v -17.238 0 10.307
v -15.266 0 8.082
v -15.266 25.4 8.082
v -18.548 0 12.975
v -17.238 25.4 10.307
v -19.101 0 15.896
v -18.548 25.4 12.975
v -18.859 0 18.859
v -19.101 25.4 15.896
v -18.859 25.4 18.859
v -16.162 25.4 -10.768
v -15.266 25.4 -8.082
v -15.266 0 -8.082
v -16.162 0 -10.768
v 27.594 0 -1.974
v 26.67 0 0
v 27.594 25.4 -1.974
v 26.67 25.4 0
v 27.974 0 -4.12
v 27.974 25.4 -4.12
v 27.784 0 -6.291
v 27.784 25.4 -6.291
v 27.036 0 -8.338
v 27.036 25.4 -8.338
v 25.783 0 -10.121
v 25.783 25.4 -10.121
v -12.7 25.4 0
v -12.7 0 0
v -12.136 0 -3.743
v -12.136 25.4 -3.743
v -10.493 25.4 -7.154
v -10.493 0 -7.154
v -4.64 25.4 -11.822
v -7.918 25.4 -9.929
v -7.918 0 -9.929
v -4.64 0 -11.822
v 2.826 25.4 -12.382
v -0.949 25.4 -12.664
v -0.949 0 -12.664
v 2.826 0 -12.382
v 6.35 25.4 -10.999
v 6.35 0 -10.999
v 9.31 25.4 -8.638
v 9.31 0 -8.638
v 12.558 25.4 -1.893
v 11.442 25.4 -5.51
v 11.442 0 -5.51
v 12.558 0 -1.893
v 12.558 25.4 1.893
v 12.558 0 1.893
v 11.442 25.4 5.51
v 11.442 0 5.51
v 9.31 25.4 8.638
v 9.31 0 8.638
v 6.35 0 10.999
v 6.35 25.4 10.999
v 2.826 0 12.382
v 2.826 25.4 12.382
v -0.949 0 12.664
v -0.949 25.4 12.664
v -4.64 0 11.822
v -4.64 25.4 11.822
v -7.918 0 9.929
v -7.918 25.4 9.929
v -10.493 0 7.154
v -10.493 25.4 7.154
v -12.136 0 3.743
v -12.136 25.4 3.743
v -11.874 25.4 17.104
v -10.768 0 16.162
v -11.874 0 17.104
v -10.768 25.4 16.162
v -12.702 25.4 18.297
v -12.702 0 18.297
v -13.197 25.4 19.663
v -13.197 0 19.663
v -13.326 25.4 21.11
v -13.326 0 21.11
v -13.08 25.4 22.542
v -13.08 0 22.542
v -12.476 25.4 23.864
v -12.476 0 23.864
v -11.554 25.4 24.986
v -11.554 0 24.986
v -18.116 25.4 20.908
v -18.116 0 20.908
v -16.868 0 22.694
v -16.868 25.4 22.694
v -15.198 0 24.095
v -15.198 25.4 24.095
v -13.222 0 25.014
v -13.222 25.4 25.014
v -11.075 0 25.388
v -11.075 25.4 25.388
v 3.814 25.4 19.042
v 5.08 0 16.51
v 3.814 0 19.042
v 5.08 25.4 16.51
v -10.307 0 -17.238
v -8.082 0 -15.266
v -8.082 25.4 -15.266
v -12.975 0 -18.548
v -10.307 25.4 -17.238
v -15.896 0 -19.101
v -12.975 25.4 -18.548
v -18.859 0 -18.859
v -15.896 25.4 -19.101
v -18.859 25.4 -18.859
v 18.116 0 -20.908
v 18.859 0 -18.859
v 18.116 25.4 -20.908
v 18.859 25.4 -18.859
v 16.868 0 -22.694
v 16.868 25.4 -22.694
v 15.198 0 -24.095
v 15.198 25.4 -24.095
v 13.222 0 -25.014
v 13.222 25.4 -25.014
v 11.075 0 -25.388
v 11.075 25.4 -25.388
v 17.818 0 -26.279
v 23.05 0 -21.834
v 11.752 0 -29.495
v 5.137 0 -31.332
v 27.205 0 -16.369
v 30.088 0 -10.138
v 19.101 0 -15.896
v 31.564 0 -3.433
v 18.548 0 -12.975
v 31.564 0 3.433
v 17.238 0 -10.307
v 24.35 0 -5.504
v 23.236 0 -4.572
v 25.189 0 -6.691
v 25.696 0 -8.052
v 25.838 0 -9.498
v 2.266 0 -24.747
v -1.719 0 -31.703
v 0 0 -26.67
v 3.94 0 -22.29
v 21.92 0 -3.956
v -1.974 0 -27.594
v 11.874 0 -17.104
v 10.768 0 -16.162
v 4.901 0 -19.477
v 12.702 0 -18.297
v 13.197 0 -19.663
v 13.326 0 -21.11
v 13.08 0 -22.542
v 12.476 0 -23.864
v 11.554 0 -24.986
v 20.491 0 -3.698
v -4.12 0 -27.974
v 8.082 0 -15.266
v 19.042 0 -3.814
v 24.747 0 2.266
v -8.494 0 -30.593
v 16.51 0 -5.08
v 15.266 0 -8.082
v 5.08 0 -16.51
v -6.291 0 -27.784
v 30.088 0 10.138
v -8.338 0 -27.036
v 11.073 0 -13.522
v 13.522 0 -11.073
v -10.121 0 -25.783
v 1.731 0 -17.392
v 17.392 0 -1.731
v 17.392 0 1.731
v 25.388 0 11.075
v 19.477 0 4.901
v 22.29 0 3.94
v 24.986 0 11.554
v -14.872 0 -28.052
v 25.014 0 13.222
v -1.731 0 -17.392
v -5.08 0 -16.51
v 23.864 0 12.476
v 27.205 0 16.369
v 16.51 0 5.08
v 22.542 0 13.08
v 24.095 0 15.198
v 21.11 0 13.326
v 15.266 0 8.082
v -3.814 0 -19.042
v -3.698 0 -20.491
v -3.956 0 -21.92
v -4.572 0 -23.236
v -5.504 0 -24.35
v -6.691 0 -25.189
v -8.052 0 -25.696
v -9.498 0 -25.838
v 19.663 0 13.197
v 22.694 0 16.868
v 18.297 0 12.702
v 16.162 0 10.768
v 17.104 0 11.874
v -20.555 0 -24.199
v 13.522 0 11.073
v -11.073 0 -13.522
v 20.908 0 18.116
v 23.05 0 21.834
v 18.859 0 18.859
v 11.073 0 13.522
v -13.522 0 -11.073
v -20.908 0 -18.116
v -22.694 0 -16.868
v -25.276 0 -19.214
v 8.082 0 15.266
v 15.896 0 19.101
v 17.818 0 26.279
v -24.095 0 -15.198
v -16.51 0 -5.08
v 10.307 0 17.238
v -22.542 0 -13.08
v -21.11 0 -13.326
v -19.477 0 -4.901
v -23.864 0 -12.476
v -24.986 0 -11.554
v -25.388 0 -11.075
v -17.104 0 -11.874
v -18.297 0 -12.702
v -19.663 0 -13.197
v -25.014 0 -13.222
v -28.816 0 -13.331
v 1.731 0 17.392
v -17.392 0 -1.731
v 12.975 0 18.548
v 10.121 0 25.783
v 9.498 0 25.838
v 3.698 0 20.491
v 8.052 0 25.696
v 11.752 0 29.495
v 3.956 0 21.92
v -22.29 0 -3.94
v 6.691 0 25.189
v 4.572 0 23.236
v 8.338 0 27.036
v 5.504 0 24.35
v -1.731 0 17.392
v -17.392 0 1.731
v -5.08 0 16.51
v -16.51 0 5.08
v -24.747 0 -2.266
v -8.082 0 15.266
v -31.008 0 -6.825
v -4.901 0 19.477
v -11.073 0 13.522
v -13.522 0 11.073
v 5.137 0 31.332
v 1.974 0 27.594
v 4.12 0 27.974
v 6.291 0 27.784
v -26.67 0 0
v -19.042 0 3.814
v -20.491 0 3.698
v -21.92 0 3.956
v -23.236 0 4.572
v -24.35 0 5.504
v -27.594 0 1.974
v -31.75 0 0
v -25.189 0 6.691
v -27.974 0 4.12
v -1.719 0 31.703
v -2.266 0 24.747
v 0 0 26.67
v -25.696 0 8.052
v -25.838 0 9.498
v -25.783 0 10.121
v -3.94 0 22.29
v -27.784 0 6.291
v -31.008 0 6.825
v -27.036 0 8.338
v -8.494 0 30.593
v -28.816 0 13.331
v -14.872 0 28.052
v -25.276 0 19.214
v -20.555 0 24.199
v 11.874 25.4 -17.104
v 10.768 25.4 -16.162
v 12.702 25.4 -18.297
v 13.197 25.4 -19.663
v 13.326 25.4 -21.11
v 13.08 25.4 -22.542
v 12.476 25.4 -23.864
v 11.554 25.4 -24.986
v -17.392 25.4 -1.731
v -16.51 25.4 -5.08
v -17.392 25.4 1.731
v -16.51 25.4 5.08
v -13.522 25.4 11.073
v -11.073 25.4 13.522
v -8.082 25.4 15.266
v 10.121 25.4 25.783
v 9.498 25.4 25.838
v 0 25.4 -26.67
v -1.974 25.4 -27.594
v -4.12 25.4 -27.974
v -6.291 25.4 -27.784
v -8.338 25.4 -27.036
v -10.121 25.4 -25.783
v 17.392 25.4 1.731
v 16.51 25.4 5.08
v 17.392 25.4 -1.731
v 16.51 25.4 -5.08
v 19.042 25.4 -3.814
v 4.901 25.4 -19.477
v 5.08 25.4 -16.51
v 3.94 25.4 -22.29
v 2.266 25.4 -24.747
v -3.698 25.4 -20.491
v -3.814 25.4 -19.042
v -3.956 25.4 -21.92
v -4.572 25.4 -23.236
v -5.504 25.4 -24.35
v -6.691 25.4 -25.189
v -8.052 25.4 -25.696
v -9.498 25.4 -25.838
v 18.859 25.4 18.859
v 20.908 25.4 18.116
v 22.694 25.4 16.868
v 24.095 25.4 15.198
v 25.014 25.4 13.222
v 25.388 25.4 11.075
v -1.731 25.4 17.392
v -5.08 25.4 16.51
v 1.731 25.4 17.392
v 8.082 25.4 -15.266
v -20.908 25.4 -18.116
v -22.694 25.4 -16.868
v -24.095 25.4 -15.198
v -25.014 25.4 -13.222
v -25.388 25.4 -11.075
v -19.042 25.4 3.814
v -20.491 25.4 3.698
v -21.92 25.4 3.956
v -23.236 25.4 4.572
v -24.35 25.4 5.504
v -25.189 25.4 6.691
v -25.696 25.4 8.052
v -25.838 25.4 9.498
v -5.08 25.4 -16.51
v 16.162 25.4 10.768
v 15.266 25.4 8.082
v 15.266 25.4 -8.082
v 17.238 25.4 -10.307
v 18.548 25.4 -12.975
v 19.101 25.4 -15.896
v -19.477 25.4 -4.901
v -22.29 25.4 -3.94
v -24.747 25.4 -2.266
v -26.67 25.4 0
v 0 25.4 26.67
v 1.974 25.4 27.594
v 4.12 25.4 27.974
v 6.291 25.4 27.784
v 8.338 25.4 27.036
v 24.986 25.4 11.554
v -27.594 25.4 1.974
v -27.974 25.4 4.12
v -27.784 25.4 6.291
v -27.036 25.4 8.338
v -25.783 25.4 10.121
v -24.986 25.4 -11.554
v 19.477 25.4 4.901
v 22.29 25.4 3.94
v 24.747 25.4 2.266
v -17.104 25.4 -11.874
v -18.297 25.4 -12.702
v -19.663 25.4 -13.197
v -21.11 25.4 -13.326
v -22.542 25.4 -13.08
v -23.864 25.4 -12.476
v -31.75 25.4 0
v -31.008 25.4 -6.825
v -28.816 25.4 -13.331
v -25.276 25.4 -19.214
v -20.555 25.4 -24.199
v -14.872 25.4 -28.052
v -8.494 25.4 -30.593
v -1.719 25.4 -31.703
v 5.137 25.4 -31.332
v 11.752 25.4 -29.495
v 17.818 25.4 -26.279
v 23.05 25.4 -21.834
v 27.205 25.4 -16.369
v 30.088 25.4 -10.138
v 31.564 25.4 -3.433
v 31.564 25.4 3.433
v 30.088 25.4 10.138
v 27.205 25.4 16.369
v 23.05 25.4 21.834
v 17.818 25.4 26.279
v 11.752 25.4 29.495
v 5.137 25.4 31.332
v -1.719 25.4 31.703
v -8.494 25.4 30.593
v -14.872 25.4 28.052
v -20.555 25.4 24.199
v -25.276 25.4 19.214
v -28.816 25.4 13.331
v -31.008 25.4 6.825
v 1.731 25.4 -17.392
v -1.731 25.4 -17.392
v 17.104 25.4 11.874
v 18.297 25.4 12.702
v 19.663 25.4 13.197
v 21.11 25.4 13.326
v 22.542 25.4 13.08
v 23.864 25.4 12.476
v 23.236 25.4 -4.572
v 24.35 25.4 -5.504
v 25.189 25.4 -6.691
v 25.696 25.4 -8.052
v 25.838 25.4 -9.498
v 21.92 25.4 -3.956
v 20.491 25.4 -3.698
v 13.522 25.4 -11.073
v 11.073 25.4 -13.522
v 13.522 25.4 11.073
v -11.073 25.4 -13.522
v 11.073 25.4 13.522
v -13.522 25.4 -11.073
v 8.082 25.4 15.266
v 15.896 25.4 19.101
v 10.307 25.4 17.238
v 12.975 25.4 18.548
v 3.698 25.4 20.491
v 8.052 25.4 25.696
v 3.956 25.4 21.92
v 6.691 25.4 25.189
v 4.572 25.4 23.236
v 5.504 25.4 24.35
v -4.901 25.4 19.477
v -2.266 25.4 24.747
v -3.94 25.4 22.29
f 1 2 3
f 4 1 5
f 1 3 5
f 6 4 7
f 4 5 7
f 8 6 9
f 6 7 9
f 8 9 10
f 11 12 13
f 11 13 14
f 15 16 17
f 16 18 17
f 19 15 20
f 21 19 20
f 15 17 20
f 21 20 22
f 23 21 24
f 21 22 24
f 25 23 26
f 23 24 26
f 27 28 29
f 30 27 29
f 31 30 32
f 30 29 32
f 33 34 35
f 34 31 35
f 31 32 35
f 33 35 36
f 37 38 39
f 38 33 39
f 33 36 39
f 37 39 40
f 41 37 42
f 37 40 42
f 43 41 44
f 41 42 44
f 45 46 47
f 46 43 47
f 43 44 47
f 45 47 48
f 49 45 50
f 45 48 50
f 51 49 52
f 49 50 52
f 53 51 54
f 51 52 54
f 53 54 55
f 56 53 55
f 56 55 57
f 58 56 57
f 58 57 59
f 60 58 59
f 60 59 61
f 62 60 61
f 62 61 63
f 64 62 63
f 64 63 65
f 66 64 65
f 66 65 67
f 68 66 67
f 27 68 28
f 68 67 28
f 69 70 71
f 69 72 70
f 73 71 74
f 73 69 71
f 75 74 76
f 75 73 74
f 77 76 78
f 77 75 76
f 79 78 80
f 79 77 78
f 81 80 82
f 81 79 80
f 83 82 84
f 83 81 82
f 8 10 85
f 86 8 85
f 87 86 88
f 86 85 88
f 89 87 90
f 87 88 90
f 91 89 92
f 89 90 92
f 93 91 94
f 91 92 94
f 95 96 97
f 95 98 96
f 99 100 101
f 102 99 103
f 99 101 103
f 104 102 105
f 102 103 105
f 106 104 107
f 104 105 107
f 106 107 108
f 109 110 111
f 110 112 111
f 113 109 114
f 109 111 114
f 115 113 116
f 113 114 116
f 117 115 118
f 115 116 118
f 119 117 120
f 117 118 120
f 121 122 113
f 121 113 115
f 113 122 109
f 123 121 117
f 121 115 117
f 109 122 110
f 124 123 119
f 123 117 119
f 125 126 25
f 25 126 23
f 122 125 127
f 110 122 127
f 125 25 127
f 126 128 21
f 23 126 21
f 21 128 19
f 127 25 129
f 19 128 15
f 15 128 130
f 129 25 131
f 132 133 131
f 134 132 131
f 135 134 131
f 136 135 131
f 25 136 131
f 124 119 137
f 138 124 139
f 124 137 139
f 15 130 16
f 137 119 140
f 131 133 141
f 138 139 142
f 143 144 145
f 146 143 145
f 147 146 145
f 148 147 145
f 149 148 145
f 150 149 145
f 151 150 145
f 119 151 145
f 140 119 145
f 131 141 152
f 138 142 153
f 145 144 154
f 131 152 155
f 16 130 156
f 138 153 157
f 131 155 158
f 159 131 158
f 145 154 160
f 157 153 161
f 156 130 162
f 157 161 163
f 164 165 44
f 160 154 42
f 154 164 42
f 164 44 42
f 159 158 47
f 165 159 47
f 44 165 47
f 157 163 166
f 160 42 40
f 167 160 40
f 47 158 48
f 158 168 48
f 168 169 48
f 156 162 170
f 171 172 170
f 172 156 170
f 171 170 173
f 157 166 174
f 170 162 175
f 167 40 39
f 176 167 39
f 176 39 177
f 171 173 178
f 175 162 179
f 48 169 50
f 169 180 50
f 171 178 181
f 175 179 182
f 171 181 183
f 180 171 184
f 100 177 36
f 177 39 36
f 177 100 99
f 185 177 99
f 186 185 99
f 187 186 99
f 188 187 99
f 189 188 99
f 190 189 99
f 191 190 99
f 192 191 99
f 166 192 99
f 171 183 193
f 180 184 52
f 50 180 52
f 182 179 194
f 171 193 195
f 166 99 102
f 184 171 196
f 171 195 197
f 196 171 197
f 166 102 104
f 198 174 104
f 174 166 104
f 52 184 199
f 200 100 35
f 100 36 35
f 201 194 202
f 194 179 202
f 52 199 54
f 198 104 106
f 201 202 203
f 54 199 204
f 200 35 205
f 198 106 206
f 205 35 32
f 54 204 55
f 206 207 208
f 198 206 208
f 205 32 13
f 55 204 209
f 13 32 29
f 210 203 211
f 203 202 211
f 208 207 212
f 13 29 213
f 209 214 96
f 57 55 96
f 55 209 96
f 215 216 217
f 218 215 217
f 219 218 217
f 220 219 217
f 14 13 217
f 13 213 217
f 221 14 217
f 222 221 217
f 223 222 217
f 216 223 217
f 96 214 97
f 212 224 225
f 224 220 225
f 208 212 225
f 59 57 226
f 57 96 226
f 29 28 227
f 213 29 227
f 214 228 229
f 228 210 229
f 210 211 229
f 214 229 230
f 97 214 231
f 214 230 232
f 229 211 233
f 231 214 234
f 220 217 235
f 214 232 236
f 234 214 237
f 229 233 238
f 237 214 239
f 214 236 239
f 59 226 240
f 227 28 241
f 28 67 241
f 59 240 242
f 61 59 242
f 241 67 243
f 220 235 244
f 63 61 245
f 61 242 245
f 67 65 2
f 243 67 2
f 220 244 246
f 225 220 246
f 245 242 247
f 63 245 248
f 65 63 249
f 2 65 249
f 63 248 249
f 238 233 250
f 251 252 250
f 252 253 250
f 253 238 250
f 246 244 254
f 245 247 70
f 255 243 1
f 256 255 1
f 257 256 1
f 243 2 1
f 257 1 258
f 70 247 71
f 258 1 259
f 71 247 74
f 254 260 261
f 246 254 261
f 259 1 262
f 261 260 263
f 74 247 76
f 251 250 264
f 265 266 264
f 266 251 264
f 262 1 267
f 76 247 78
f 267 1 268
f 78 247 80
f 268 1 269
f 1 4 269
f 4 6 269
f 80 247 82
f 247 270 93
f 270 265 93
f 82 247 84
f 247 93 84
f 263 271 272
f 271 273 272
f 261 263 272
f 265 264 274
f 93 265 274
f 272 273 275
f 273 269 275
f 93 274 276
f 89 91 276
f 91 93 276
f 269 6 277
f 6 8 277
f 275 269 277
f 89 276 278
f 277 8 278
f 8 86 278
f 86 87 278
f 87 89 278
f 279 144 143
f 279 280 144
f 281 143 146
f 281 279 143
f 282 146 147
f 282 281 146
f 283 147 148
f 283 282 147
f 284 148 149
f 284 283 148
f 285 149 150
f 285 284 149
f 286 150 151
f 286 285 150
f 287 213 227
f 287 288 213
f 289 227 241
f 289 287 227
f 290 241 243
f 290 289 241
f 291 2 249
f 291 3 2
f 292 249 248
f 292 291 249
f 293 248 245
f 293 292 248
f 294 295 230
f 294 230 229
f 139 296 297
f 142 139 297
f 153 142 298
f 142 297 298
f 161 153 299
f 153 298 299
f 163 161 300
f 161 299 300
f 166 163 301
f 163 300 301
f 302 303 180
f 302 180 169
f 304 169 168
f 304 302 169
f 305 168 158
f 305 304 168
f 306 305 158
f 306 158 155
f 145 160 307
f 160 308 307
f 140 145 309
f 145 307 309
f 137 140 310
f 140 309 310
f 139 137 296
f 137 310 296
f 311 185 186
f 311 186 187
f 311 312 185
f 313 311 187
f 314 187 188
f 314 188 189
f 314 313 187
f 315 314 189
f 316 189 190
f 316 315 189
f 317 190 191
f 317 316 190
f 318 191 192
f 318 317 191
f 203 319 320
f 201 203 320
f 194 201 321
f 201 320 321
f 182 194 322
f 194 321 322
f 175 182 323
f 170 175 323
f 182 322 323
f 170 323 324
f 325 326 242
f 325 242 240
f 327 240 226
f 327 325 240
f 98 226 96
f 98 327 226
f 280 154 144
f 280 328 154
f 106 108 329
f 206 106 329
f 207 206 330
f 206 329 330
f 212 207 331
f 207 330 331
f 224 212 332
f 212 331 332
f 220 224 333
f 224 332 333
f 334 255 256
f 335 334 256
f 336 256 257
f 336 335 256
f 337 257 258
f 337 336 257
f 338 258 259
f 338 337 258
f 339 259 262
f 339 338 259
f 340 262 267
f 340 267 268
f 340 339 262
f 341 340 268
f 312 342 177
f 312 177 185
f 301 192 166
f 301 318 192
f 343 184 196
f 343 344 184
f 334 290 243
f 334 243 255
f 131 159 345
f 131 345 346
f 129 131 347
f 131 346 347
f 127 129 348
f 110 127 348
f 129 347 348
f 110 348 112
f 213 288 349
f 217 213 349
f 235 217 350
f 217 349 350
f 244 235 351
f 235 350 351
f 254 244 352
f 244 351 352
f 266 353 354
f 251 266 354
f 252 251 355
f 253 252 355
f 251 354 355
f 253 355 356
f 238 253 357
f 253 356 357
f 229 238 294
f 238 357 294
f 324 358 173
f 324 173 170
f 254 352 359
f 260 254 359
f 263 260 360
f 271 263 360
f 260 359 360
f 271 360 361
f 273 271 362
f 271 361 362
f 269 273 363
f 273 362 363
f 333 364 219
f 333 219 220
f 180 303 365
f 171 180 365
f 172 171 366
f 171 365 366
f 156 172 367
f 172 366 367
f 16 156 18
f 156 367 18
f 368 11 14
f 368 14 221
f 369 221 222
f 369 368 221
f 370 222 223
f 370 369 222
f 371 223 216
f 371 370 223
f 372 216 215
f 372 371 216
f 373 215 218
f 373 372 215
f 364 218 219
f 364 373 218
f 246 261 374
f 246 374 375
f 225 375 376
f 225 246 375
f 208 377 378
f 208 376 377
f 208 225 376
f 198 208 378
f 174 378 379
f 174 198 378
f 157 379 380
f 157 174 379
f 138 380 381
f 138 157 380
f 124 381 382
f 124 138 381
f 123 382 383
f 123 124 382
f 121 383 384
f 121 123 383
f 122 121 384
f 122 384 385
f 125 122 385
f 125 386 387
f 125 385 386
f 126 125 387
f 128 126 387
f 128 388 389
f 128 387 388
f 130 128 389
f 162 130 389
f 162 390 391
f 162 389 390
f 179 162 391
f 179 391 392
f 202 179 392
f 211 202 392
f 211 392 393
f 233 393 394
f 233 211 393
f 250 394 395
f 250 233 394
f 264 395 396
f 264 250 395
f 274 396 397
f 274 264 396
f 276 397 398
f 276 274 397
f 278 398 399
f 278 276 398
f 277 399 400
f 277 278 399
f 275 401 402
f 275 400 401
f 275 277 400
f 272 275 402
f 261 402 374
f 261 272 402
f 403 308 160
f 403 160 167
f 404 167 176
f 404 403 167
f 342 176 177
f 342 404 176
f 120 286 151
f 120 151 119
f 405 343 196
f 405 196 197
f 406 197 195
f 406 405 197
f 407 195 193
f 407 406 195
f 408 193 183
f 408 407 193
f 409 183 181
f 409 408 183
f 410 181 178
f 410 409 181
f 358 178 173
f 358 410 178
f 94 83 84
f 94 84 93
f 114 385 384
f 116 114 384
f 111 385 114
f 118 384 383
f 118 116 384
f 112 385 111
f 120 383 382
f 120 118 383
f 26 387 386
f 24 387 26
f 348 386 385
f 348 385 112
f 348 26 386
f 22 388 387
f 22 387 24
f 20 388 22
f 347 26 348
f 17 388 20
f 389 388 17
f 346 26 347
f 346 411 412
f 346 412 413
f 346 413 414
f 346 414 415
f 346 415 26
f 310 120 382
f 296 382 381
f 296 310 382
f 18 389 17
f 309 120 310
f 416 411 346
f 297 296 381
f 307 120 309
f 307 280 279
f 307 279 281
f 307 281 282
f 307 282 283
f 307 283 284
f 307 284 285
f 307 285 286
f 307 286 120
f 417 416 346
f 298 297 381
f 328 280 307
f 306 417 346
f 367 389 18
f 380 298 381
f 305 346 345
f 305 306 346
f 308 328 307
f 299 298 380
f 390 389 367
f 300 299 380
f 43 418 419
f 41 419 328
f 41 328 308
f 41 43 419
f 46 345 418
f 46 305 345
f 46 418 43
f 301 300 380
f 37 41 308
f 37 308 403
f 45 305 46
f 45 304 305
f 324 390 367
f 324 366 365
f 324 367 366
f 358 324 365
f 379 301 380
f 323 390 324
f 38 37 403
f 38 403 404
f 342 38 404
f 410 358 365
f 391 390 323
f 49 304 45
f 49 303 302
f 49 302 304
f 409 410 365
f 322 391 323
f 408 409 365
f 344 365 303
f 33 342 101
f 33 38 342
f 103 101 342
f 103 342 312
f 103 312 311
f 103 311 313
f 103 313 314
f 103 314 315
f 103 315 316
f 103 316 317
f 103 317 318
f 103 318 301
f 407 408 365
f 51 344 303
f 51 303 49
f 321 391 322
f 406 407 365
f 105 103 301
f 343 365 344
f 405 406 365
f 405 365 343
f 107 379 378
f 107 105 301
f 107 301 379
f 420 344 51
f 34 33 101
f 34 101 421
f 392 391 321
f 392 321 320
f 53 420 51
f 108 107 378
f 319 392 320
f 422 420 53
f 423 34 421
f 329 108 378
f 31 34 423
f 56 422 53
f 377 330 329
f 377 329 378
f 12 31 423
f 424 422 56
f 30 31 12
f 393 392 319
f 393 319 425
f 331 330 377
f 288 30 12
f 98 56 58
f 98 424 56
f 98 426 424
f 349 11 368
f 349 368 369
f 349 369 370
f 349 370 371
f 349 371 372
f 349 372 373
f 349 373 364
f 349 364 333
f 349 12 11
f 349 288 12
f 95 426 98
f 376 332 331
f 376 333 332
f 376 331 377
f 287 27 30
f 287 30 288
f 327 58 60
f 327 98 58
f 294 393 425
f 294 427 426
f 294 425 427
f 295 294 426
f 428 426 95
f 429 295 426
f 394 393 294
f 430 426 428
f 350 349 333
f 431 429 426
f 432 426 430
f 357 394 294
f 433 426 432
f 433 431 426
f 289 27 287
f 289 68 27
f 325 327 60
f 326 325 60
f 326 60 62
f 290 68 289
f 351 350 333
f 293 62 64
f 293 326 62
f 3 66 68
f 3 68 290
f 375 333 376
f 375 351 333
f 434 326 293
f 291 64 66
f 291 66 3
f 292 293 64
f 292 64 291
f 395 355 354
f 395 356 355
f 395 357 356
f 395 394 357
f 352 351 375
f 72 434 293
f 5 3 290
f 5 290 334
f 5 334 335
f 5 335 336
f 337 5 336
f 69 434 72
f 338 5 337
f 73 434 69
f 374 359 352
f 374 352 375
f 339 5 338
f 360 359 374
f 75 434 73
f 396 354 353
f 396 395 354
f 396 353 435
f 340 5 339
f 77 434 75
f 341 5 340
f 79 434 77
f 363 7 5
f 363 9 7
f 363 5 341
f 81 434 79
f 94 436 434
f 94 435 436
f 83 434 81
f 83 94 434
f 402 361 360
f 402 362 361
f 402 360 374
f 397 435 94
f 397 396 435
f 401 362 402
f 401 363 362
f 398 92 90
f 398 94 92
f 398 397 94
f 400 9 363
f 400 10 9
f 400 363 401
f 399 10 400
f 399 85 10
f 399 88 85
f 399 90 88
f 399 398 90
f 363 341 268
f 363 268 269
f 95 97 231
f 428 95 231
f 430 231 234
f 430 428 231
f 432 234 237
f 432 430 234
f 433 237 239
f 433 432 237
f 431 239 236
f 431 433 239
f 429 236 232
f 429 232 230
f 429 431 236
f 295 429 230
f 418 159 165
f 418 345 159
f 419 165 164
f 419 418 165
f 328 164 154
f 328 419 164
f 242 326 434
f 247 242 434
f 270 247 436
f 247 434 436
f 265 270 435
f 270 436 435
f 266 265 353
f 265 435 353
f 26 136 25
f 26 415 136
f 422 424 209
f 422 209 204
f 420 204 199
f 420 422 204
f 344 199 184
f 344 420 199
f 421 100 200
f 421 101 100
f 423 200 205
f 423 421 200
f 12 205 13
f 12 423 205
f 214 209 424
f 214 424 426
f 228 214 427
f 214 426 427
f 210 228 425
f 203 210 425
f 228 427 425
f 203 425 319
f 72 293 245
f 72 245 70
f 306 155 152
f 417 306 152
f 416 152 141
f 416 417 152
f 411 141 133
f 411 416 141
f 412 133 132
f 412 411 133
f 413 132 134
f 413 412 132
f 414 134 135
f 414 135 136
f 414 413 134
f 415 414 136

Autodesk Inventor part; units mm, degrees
ref_plane "YZ Plane" through (0, 0, 0) normal (1, 0, 0) x (0, 1, 0)
ref_plane "XZ Plane" through (0, 0, 0) normal (0, 1, 0) x (-1, 0, 0)
ref_plane "XY Plane" through (0, 0, 0) normal (0, 0, 1) x (1, 0, 0)
sketch "Sketch1" plane through (0, 0, 0) normal (0, 1, 0) x (-1, 0, 0)
  circle A0 centre (0, 0) radius 12.7
  circle A1 centre (0, 0) radius 31.75
  dimension "d0" = 25.4
  dimension "d1" = 63.5
extrude "Extrusion1" add sketch "Sketch1" along normal blind 25.4
sketch "Sketch2" plane through (0, 25.4, 0) normal (0, 1, 0) x (1, 0, 0)
  circle A0 centre (0, 0) radius 31.75 projected
  line L0 (-31.75, 0) -> (-26.67, 0)
  line L1 (-26.67, 0) -> (-16.51, 0)
  line L2 (-16.51, 5.08) -> (-26.67, 0)
  line L3 (-16.51, -5.08) -> (-26.67, 0)
  arc A1 (-16.51, 5.08) -> (-26.67, 0) centre (-17.3323, -5.9755) ccw
  line L4 (-26.67, 0) -> (-25.783, -10.1212)
  arc A2 (-26.67, 0) -> (-25.783, -10.1212) centre (-19.661, -4.4852) ccw
  arc A3 (-16.51, 5.08) -> (-16.51, -5.08) centre (-4.0157, 0) ccw
  arc A4 (-16.51, -5.08) -> (-25.783, -10.1212) centre (-20.2123, -9.3191) ccw
  dimension "d4" = 5.08
  dimension "d6" = 5.08
  dimension "d7" = 10.16
  dimension "d13" = 10.16
extrude "Extrusion2" cut sketch "Sketch2" against normal blind 25.4 contours A1 L2 | L2 A3 L1 | L1 A3 A4 L3 | L3 A4 L4 | L4 A4 A2 | A4 L3 | L4 A4
pattern_circular "Circular Pattern1" count 8 over 360 about axis through (0, 0, 0) along (0, 1, 0) of "Extrusion2"
properties part number "whee"
